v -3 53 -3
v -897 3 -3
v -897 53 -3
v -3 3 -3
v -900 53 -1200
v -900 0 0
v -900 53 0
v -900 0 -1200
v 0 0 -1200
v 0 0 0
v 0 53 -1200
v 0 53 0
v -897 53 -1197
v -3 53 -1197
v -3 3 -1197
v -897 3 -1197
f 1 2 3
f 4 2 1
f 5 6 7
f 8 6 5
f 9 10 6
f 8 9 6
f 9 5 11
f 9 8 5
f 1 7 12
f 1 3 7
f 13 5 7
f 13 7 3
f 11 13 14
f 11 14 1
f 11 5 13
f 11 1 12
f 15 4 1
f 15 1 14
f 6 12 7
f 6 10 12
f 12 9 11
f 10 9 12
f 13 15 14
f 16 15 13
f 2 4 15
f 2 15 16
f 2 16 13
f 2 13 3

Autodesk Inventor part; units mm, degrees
ref_plane "YZ Plane" through (0, 0, 0) normal (1, 0, 0) x (0, 1, 0)
ref_plane "XZ Plane" through (0, 0, 0) normal (0, 1, 0) x (-1, 0, 0)
ref_plane "XY Plane" through (0, 0, 0) normal (0, 0, 1) x (1, 0, 0)
sketch "Boceto1" plane through (0, 0, 0) normal (0, 1, 0) x (-1, 0, 0)
  line L0 (0, 0) -> (900, 0)
  line L1 (900, 0) -> (900, -1200)
  line L2 (900, -1200) -> (0, -1200)
  line L3 (0, -1200) -> (0, 0)
  dimension "d0" = 900
  dimension "d1" = 1200
extrude "Extrusión1" add sketch "Boceto1" along normal blind 3
sketch "Boceto2" plane through (0, 3, 0) normal (0, 1, 0) x (1, 0, 0)
  line L0 (0, 1200) -> (-900, 1200) projected
  line L1 (0, 0) -> (-900, 0)
  line L2 (-900, 0) -> (-900, 1200)
  line L3 (-900, 1200) -> (0, 1200)
  line L4 (0, 1200) -> (0, 0)
  line L5 (-897, 1197) -> (-897, 3)
  line L6 (-897, 3) -> (-3, 3)
  line L7 (-3, 3) -> (-3, 1197)
  line L8 (-3, 1197) -> (-897, 1197)
  dimension "d4" = 3
extrude "Extrusión2" add sketch "Boceto2" along normal blind 50
properties part number "tapa mesa"
